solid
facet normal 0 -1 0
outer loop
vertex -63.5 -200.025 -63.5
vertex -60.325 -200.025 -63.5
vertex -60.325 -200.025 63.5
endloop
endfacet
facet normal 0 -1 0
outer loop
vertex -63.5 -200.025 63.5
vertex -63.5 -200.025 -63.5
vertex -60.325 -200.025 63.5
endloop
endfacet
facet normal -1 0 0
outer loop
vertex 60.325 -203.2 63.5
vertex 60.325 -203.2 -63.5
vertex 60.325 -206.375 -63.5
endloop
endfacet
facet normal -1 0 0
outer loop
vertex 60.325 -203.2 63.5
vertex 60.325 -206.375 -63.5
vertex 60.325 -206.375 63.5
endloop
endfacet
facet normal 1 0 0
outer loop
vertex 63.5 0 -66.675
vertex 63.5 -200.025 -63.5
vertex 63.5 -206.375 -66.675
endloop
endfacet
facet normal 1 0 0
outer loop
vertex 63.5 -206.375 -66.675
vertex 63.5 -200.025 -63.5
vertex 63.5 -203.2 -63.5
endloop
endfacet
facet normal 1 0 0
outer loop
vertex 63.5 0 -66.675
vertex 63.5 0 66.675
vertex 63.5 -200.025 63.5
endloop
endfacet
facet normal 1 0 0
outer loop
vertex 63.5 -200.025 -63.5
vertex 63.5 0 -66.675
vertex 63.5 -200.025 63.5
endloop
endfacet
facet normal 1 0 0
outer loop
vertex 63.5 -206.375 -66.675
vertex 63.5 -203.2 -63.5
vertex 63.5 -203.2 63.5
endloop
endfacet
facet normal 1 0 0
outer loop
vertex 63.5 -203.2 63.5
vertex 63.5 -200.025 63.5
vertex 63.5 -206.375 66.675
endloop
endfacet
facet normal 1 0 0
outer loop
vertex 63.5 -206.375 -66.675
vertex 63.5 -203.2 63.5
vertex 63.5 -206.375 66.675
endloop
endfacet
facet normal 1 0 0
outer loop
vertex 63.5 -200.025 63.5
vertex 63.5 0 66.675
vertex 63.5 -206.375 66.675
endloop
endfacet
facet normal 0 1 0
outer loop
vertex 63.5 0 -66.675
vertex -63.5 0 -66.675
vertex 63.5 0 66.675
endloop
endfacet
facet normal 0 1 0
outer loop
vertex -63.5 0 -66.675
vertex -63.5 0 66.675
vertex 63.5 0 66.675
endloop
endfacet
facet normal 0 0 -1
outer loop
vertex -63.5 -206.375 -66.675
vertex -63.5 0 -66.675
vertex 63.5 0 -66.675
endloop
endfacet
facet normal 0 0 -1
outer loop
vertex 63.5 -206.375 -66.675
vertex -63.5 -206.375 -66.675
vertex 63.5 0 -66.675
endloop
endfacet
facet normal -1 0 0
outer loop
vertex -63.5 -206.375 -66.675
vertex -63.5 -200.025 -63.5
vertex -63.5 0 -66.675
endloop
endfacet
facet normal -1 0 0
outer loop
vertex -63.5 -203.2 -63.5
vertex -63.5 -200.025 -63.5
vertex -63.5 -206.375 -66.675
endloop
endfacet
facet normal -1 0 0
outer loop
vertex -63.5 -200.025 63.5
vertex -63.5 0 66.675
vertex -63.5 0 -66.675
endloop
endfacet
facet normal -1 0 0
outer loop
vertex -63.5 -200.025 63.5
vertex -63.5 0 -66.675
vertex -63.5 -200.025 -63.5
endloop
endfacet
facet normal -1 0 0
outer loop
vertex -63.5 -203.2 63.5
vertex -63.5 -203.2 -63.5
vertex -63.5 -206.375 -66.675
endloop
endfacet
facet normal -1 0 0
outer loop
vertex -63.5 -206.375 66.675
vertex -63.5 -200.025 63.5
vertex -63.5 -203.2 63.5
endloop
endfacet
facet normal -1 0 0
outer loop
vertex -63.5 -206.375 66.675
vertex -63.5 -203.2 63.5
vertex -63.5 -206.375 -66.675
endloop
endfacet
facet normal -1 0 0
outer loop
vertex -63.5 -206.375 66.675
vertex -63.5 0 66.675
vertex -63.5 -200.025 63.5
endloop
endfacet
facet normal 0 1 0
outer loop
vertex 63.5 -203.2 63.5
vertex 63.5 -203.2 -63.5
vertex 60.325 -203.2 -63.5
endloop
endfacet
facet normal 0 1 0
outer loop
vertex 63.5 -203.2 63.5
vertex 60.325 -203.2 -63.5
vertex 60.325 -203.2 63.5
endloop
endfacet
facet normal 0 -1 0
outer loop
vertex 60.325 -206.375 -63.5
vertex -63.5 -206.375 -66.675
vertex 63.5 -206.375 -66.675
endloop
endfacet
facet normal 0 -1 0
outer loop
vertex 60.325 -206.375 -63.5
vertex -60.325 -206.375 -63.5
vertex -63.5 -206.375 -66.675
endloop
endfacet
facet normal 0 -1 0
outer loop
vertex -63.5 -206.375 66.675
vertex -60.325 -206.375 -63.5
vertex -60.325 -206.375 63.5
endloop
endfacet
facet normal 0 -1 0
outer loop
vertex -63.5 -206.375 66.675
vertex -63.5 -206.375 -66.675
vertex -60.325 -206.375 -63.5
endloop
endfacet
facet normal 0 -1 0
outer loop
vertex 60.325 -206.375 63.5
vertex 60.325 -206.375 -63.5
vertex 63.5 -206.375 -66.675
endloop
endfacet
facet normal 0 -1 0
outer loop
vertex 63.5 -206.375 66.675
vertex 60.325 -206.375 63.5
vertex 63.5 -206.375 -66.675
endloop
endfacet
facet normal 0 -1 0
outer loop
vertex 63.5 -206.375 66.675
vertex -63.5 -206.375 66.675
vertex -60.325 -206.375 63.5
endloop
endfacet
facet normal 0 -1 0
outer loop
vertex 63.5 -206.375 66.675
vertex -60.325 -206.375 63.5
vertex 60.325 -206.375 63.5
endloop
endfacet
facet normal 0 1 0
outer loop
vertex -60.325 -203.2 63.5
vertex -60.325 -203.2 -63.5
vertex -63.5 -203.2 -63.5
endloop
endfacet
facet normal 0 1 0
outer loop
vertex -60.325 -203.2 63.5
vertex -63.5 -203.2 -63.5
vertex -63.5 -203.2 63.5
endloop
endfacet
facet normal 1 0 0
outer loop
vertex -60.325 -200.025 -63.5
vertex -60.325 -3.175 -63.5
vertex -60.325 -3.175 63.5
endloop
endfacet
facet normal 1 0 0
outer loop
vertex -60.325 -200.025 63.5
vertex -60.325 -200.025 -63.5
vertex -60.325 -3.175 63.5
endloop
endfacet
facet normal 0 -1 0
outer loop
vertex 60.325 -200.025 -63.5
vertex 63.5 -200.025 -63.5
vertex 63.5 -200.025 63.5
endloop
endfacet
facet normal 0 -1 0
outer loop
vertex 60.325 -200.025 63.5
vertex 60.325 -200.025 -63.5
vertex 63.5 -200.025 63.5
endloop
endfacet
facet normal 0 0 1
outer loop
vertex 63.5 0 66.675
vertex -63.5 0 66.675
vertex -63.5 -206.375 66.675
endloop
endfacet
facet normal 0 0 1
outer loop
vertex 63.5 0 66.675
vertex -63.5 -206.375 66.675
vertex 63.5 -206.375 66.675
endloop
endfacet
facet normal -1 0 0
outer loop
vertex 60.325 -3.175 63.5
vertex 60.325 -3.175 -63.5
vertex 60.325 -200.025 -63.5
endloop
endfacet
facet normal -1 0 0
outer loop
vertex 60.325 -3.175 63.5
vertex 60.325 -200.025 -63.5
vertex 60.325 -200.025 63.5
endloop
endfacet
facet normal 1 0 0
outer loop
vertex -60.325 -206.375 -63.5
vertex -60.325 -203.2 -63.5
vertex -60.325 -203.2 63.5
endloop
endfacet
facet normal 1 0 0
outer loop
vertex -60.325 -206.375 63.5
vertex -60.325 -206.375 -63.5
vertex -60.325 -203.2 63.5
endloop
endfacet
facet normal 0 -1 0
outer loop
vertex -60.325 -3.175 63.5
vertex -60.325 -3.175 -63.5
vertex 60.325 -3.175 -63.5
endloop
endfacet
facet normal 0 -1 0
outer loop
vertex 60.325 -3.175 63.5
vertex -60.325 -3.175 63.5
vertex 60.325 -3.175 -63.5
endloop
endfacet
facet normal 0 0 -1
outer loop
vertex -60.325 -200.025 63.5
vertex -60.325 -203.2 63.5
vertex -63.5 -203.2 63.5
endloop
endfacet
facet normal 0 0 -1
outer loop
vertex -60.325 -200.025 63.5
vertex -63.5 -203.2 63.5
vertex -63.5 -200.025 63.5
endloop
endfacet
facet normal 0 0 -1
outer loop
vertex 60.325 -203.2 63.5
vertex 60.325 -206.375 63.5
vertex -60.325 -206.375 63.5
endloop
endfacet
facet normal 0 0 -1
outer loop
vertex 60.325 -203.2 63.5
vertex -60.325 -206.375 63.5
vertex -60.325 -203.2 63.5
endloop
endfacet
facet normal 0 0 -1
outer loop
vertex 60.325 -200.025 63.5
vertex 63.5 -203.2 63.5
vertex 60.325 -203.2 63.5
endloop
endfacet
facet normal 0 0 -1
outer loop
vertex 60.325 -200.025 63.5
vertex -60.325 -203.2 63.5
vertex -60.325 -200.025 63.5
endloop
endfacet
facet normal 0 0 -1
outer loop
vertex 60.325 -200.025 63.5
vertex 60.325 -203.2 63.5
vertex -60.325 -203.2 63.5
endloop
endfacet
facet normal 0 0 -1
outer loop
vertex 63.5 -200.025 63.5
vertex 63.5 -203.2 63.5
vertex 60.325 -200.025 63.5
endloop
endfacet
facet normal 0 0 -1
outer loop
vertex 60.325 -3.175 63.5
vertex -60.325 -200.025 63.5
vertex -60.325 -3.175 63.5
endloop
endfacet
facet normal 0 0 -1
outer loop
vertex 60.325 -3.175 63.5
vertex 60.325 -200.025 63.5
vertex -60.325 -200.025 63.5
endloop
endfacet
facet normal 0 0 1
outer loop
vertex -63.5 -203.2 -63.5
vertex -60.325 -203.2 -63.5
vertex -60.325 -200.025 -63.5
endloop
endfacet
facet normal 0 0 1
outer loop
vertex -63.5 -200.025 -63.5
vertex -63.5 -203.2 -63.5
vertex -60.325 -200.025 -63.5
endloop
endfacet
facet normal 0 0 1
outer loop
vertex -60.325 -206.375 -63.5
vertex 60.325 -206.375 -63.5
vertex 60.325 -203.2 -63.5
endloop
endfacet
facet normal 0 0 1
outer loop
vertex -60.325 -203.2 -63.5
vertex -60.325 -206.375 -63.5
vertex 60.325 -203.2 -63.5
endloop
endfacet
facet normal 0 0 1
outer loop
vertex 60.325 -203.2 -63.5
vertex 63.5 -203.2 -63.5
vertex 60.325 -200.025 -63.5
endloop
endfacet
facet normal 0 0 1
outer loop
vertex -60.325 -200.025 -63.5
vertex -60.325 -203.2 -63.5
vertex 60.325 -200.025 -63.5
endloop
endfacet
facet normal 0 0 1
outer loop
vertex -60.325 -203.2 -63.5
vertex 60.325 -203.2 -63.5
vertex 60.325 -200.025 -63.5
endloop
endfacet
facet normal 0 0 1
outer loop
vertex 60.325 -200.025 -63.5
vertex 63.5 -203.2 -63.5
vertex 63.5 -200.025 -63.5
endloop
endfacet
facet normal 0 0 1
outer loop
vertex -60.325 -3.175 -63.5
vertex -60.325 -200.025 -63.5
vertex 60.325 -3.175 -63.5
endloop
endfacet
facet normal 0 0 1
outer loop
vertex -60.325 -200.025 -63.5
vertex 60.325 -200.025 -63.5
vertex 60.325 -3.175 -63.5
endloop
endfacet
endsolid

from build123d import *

# Parameters (mm, degrees)
F0_W     = 127
F0_H     = 127
F1_DEPTH = 3.175
F2_W     = 3.175
F2_H     = 127
F3_DEPTH = 203.2
F4_W     = 127
F4_H     = 206.375
F5_DEPTH = 3.175
F6_W     = 127
F6_H     = 206.375
F7_DEPTH = 3.175
F8_W     = 3.175
F8_H     = 127
F9_DEPTH = 127.001


with BuildPart() as f1:
    # F0 (on Front) → F1 (new body)
    with BuildSketch(Plane.XZ):
        Rectangle(F0_W, F0_H)
    extrude(amount=F1_DEPTH)

    # F2 (on face) → F3 (join)
    with BuildSketch(Plane.XZ.offset(3.175)):
        with Locations((-61.9125, 0)):
            Rectangle(F2_W, F2_H)
        with Locations((61.9125, 0)):
            Rectangle(F2_W, F2_H)
    extrude(amount=F3_DEPTH)

    # F4 (on face) → F5 (join)
    with BuildSketch(Plane.XY.offset(63.5)):
        with Locations((0, -103.1875)):
            Rectangle(F4_W, F4_H)
    extrude(amount=F5_DEPTH)

    # F6 (on face) → F7 (join)
    with BuildSketch(Plane(origin=(0, 0, -63.5), x_dir=(1, 0, 0), z_dir=(0, 0, -1))):
        with Locations((0, 103.1875)):
            Rectangle(F6_W, F6_H)
    extrude(amount=F7_DEPTH)

    # F8 (on face) → F9 (cut, through all)
    with BuildSketch(Plane.YZ.offset(63.5)):
        with Locations((-201.6125, 0)):
            Rectangle(F8_W, F8_H)
    extrude(amount=-F9_DEPTH, mode=Mode.SUBTRACT)


solid = f1.part
